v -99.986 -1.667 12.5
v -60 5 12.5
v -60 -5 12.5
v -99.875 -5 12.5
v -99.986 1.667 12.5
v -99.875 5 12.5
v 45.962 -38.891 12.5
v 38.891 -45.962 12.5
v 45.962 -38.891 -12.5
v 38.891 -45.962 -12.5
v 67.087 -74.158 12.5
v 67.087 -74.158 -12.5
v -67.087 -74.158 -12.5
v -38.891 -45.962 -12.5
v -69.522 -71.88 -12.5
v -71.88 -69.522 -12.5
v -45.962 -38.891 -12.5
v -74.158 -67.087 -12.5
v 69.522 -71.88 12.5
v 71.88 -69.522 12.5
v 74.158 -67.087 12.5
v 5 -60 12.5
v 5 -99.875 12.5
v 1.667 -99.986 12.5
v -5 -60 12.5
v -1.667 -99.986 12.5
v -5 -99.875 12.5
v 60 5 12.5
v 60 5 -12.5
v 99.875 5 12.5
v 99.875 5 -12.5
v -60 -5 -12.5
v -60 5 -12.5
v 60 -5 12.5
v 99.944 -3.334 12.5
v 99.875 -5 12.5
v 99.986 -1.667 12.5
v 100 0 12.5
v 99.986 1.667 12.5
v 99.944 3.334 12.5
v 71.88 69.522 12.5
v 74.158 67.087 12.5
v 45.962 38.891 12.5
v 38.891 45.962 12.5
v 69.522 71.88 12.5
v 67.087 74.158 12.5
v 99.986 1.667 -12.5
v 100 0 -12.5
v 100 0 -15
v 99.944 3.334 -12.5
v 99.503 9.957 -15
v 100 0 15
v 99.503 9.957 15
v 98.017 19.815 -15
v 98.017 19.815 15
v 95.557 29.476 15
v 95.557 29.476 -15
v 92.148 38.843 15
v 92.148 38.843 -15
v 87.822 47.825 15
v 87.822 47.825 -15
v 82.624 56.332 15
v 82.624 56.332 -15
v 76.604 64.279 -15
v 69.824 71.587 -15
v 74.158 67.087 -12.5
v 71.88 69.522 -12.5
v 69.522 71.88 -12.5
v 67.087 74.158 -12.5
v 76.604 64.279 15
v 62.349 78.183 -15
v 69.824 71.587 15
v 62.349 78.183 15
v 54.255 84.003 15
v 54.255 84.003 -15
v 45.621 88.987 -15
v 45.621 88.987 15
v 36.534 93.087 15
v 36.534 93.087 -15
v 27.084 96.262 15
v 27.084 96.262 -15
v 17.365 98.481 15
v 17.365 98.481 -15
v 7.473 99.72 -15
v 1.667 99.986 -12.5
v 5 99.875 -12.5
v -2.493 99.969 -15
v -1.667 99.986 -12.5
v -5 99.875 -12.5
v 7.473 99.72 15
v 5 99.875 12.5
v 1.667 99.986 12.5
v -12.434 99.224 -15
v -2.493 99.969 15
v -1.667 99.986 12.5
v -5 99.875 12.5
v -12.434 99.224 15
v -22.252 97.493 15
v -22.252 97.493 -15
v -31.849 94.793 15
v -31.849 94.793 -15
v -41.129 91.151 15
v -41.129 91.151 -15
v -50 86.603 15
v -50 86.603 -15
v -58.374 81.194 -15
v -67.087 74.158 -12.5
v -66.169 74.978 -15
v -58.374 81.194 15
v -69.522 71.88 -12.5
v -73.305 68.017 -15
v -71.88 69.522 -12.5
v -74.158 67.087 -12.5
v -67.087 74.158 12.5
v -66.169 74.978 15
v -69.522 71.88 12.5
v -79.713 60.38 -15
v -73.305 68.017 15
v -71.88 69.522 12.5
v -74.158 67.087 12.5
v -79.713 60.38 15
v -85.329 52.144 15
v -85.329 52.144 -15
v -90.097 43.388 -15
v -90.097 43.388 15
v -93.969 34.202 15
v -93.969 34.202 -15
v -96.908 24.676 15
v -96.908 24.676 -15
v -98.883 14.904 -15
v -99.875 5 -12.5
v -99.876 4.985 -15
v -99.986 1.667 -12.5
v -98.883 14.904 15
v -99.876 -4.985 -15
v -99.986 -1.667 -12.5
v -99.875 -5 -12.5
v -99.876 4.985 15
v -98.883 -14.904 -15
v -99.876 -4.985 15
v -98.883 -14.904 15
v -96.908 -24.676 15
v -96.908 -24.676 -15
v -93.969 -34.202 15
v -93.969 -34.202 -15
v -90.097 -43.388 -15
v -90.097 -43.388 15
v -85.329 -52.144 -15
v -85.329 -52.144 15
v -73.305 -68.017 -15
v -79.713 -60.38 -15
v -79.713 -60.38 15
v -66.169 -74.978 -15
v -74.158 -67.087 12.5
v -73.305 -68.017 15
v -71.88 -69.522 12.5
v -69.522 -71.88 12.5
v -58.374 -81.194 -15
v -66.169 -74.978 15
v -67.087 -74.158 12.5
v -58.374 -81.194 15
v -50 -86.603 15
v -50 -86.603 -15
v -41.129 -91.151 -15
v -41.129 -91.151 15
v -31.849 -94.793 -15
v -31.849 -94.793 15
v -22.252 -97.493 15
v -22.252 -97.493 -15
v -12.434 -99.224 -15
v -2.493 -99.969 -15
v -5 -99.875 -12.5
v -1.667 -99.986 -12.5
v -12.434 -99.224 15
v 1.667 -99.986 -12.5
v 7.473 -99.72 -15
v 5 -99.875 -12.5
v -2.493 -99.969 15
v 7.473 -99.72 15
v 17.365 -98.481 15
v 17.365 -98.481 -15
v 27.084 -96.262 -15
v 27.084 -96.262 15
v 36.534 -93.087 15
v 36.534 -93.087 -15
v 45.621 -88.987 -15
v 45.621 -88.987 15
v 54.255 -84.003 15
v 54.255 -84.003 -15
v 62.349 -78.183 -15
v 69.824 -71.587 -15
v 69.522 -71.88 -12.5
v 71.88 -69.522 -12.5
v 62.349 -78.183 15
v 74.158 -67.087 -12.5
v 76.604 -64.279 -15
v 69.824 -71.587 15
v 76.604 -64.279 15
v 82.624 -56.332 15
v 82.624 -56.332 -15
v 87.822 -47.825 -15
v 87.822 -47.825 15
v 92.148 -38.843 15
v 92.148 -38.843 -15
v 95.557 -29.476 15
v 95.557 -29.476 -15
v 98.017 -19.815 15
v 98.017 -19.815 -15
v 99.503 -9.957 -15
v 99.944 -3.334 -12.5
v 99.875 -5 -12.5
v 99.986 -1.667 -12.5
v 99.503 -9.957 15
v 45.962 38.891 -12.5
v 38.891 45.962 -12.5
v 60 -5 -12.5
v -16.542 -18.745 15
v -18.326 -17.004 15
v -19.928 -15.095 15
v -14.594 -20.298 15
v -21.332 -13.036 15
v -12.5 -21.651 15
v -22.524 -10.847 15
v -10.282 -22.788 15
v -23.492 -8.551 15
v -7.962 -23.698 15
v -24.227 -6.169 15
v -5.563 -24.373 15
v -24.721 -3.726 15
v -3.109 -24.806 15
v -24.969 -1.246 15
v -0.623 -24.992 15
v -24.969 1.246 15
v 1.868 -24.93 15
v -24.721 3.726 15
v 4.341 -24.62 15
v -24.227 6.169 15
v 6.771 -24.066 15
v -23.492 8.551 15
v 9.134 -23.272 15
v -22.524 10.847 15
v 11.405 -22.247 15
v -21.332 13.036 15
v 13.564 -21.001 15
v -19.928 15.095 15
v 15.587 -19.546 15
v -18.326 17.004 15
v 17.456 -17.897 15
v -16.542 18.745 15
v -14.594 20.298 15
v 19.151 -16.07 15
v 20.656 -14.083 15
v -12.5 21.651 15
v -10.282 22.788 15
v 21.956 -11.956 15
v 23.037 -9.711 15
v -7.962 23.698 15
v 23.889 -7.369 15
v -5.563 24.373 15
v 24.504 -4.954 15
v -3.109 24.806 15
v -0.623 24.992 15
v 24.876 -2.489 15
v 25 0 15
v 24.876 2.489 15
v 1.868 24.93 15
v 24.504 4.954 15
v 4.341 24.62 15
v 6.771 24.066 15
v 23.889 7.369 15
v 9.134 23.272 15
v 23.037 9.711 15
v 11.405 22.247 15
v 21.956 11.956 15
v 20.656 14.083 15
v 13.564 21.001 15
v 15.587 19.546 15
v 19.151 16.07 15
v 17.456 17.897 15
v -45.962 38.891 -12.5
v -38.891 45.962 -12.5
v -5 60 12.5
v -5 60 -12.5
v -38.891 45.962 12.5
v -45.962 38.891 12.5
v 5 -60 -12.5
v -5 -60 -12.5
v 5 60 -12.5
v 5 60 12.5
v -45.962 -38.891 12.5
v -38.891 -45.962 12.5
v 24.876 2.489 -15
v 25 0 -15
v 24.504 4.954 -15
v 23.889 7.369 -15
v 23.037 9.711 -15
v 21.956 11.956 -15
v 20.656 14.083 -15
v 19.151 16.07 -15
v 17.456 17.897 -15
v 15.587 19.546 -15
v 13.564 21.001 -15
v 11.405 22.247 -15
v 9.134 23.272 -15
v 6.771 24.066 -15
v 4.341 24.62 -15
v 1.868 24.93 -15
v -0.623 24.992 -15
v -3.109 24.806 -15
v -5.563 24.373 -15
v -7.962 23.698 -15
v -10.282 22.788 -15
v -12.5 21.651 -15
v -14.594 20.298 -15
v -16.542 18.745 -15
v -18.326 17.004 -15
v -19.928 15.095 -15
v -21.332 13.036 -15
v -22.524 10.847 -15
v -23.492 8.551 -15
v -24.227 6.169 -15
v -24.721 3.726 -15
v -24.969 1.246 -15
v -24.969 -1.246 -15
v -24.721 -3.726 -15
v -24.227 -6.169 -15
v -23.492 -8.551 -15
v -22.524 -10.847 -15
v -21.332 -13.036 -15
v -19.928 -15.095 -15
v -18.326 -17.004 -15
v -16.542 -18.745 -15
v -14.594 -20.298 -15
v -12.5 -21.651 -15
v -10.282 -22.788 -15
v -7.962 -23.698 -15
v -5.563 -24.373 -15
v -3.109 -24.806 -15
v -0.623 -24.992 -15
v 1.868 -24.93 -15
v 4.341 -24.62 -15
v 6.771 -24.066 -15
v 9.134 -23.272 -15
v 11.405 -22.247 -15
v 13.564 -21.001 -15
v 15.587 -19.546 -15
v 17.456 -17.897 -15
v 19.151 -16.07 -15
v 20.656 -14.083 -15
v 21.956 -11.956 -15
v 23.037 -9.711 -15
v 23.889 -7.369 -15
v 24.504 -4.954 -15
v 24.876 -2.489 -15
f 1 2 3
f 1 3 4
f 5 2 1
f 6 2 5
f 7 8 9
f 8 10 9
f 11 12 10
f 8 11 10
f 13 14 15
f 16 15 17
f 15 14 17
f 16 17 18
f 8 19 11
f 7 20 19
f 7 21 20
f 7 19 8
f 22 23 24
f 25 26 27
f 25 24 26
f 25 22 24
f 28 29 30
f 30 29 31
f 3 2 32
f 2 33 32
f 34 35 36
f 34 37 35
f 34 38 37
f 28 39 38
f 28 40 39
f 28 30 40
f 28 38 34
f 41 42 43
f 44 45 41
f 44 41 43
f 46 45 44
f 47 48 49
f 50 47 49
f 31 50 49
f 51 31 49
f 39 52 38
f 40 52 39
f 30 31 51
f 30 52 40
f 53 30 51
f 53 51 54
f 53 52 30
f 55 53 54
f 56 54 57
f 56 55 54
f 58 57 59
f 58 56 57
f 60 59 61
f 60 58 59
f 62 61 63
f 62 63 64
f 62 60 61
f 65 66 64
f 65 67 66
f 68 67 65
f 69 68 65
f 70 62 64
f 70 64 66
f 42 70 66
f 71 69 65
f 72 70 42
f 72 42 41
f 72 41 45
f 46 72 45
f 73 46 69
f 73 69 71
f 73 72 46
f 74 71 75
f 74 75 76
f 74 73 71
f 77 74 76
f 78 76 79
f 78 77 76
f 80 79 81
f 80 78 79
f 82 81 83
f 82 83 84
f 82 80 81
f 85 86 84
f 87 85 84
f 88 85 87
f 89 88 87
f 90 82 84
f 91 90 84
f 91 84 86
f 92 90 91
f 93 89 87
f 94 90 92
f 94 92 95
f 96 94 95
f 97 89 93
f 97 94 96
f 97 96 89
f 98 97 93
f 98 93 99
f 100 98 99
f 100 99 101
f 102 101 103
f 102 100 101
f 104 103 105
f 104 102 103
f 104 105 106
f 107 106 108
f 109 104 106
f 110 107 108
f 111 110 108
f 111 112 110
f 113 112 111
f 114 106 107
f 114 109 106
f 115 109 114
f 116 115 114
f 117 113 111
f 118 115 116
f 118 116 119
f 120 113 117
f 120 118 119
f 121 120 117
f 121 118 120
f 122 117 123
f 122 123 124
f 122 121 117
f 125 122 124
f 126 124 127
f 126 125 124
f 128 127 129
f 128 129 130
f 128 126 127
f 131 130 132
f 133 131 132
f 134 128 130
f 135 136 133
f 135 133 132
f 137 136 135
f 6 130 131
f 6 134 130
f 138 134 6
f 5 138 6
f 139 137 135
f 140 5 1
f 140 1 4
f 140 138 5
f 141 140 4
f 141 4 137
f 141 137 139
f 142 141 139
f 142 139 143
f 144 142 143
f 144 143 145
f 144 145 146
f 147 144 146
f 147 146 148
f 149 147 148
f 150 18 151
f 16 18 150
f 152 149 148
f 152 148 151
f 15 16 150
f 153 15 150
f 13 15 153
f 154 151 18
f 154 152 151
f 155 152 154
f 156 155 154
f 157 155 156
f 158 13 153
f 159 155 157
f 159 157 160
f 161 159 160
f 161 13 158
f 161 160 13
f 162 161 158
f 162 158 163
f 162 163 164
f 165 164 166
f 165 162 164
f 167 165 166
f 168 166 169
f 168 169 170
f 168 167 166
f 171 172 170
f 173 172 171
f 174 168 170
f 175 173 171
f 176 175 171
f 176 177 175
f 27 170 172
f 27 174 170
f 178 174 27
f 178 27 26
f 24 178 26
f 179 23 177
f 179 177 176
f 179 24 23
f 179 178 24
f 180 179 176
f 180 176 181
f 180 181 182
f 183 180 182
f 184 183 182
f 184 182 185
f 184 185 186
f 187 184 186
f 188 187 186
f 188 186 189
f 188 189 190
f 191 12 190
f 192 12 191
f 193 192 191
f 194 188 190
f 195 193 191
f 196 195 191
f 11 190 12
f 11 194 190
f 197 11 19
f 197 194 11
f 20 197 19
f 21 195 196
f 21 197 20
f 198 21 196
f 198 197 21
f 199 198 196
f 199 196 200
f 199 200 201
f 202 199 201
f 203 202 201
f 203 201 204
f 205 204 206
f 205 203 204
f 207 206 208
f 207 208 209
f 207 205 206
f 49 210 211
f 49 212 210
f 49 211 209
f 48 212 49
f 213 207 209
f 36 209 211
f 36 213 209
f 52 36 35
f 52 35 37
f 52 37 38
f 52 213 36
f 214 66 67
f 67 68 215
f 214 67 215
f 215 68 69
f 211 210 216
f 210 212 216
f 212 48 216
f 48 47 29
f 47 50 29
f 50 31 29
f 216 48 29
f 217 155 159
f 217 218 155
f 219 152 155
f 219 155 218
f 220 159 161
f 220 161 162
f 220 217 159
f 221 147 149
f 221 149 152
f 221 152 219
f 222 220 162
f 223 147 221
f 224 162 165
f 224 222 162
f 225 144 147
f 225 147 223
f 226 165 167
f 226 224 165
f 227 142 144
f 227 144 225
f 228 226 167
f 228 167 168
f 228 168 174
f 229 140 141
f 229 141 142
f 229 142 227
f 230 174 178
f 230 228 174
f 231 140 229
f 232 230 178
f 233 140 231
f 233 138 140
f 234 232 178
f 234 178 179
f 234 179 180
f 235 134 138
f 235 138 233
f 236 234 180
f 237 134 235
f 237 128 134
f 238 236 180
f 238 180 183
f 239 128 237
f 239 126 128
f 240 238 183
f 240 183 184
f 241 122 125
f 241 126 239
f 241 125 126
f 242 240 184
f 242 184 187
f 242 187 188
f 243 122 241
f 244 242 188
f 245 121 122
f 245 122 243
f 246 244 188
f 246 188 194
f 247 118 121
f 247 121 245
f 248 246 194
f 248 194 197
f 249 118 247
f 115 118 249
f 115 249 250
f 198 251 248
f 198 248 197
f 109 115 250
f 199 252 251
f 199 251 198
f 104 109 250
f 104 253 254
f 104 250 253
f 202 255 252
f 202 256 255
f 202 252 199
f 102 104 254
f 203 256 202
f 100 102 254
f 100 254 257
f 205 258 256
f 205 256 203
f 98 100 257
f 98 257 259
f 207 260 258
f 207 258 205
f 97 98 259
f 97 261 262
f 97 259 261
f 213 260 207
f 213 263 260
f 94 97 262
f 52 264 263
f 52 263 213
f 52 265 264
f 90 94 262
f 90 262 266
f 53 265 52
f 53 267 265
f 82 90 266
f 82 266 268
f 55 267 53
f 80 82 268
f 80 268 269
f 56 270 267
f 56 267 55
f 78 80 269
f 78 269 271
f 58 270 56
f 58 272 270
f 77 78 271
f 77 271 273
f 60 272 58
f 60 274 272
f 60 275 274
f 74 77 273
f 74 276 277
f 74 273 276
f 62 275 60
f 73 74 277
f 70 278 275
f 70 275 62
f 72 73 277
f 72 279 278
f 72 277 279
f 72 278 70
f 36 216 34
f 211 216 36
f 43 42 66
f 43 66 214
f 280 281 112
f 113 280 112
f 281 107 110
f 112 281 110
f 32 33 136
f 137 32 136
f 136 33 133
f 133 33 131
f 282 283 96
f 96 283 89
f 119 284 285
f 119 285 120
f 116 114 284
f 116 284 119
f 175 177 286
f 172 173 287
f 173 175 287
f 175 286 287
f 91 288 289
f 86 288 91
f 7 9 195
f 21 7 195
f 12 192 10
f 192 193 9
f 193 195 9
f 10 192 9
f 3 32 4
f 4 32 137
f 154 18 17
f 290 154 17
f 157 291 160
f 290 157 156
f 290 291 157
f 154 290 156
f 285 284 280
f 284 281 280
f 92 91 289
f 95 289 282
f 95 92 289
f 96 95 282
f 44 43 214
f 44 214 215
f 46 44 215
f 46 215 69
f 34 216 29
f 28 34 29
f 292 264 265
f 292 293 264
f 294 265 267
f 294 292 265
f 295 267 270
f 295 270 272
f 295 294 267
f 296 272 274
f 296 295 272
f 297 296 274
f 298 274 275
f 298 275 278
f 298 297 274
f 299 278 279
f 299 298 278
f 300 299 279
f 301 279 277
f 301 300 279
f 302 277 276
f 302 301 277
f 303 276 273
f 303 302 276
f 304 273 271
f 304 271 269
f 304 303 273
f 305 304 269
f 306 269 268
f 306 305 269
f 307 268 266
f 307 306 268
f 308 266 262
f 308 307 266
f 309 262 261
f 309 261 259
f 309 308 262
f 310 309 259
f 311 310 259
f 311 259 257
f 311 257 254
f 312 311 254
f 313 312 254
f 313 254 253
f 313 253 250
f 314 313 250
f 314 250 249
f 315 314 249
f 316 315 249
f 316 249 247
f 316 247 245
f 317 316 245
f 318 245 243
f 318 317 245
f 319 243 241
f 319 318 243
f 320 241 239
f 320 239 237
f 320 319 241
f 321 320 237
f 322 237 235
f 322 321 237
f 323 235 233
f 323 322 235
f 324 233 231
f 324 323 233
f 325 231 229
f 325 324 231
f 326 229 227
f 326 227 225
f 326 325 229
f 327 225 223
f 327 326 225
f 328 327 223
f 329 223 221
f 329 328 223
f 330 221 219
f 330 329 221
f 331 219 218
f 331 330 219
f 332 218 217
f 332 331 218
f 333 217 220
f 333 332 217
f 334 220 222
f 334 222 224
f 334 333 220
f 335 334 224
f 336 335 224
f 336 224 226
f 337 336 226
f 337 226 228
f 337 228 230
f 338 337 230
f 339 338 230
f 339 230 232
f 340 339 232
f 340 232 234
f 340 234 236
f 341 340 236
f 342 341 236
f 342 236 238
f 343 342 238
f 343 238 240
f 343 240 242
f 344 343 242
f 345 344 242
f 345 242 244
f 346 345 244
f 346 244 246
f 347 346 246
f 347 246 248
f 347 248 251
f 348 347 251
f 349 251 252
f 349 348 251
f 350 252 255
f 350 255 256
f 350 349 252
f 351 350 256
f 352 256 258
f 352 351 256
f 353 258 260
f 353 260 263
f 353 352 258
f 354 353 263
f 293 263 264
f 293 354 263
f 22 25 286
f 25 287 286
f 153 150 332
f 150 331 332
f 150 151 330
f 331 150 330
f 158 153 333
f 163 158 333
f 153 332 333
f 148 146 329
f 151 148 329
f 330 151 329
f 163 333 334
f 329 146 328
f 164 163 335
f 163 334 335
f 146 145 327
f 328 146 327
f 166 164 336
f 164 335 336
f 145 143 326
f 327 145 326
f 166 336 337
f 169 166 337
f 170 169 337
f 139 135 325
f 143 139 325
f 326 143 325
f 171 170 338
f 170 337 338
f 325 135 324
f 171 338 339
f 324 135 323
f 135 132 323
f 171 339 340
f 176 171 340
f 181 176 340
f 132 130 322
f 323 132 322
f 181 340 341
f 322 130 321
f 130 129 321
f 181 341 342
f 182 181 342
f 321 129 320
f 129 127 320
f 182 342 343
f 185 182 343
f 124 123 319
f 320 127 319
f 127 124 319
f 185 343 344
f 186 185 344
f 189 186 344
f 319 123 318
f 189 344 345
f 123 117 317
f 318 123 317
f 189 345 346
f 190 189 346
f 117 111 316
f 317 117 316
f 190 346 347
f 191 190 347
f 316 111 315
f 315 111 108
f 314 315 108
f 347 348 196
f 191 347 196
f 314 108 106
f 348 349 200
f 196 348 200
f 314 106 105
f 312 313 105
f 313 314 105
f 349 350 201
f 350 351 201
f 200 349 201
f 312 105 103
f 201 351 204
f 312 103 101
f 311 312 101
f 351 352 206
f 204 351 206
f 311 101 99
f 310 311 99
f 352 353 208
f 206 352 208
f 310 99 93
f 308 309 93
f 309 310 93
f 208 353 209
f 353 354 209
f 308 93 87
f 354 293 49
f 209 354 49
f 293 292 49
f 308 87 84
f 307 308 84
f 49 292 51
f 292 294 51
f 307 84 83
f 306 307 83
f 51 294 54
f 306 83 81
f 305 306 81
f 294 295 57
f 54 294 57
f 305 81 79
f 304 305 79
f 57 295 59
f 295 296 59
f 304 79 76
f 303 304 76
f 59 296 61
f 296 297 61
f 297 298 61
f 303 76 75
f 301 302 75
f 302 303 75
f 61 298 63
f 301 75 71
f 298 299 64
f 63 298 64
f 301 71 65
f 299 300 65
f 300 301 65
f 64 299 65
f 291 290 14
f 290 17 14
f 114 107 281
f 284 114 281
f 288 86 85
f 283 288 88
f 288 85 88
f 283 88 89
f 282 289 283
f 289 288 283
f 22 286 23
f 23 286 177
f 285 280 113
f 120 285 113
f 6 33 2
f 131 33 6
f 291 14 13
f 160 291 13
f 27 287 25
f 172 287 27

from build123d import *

# Parameters (mm, degrees)
SKETCH1_R           = 100
SKETCH1_R_2         = 25
BOSS_EXTRUDE1_DEPTH = 15
CUT_EXTRUDE1_DEPTH  = 12.5


with BuildPart() as part:
    # Sketch1 → Boss-Extrude1 (new, symmetric)
    with BuildSketch(Plane.XY):
        Circle(SKETCH1_R)
        Circle(SKETCH1_R_2, mode=Mode.SUBTRACT)
    extrude(amount=BOSS_EXTRUDE1_DEPTH, both=True)

    # Sketch2 → Cut-Extrude1 (cut, symmetric)
    with BuildSketch(Plane.XY):
        Polygon((100, 5), (110, -5), (100, -5), (60, -5), (60, 5), align=None)
        Polygon((45.961940777, -38.890872965), (74.246212025, -67.175144213), (74.246212025, -81.317279836), (67.175144213, -74.246212025), (38.890872965, -45.961940777), align=None)
        Polygon((5, -60), (5, -100), (-5, -110), (-5, -100), (-5, -60), align=None)
        Polygon((-38.890872965, -45.961940777), (-67.175144213, -74.246212025), (-81.317279836, -74.246212025), (-74.246212025, -67.175144213), (-45.961940777, -38.890872965), align=None)
        Polygon((-60, -5), (-100, -5), (-110, 5), (-100, 5), (-60, 5), align=None)
        Polygon((-45.961940777, 38.890872965), (-74.246212025, 67.175144213), (-74.246212025, 81.317279836), (-67.175144213, 74.246212025), (-38.890872965, 45.961940777), align=None)
        Polygon((-5, 60), (-5, 100), (5, 110), (5, 100), (5, 60), align=None)
        Polygon((38.890872965, 45.961940777), (67.175144213, 74.246212025), (81.317279836, 74.246212025), (74.246212025, 67.175144213), (45.961940777, 38.890872965), align=None)
    extrude(amount=CUT_EXTRUDE1_DEPTH, both=True, mode=Mode.SUBTRACT)


solid = part.part
